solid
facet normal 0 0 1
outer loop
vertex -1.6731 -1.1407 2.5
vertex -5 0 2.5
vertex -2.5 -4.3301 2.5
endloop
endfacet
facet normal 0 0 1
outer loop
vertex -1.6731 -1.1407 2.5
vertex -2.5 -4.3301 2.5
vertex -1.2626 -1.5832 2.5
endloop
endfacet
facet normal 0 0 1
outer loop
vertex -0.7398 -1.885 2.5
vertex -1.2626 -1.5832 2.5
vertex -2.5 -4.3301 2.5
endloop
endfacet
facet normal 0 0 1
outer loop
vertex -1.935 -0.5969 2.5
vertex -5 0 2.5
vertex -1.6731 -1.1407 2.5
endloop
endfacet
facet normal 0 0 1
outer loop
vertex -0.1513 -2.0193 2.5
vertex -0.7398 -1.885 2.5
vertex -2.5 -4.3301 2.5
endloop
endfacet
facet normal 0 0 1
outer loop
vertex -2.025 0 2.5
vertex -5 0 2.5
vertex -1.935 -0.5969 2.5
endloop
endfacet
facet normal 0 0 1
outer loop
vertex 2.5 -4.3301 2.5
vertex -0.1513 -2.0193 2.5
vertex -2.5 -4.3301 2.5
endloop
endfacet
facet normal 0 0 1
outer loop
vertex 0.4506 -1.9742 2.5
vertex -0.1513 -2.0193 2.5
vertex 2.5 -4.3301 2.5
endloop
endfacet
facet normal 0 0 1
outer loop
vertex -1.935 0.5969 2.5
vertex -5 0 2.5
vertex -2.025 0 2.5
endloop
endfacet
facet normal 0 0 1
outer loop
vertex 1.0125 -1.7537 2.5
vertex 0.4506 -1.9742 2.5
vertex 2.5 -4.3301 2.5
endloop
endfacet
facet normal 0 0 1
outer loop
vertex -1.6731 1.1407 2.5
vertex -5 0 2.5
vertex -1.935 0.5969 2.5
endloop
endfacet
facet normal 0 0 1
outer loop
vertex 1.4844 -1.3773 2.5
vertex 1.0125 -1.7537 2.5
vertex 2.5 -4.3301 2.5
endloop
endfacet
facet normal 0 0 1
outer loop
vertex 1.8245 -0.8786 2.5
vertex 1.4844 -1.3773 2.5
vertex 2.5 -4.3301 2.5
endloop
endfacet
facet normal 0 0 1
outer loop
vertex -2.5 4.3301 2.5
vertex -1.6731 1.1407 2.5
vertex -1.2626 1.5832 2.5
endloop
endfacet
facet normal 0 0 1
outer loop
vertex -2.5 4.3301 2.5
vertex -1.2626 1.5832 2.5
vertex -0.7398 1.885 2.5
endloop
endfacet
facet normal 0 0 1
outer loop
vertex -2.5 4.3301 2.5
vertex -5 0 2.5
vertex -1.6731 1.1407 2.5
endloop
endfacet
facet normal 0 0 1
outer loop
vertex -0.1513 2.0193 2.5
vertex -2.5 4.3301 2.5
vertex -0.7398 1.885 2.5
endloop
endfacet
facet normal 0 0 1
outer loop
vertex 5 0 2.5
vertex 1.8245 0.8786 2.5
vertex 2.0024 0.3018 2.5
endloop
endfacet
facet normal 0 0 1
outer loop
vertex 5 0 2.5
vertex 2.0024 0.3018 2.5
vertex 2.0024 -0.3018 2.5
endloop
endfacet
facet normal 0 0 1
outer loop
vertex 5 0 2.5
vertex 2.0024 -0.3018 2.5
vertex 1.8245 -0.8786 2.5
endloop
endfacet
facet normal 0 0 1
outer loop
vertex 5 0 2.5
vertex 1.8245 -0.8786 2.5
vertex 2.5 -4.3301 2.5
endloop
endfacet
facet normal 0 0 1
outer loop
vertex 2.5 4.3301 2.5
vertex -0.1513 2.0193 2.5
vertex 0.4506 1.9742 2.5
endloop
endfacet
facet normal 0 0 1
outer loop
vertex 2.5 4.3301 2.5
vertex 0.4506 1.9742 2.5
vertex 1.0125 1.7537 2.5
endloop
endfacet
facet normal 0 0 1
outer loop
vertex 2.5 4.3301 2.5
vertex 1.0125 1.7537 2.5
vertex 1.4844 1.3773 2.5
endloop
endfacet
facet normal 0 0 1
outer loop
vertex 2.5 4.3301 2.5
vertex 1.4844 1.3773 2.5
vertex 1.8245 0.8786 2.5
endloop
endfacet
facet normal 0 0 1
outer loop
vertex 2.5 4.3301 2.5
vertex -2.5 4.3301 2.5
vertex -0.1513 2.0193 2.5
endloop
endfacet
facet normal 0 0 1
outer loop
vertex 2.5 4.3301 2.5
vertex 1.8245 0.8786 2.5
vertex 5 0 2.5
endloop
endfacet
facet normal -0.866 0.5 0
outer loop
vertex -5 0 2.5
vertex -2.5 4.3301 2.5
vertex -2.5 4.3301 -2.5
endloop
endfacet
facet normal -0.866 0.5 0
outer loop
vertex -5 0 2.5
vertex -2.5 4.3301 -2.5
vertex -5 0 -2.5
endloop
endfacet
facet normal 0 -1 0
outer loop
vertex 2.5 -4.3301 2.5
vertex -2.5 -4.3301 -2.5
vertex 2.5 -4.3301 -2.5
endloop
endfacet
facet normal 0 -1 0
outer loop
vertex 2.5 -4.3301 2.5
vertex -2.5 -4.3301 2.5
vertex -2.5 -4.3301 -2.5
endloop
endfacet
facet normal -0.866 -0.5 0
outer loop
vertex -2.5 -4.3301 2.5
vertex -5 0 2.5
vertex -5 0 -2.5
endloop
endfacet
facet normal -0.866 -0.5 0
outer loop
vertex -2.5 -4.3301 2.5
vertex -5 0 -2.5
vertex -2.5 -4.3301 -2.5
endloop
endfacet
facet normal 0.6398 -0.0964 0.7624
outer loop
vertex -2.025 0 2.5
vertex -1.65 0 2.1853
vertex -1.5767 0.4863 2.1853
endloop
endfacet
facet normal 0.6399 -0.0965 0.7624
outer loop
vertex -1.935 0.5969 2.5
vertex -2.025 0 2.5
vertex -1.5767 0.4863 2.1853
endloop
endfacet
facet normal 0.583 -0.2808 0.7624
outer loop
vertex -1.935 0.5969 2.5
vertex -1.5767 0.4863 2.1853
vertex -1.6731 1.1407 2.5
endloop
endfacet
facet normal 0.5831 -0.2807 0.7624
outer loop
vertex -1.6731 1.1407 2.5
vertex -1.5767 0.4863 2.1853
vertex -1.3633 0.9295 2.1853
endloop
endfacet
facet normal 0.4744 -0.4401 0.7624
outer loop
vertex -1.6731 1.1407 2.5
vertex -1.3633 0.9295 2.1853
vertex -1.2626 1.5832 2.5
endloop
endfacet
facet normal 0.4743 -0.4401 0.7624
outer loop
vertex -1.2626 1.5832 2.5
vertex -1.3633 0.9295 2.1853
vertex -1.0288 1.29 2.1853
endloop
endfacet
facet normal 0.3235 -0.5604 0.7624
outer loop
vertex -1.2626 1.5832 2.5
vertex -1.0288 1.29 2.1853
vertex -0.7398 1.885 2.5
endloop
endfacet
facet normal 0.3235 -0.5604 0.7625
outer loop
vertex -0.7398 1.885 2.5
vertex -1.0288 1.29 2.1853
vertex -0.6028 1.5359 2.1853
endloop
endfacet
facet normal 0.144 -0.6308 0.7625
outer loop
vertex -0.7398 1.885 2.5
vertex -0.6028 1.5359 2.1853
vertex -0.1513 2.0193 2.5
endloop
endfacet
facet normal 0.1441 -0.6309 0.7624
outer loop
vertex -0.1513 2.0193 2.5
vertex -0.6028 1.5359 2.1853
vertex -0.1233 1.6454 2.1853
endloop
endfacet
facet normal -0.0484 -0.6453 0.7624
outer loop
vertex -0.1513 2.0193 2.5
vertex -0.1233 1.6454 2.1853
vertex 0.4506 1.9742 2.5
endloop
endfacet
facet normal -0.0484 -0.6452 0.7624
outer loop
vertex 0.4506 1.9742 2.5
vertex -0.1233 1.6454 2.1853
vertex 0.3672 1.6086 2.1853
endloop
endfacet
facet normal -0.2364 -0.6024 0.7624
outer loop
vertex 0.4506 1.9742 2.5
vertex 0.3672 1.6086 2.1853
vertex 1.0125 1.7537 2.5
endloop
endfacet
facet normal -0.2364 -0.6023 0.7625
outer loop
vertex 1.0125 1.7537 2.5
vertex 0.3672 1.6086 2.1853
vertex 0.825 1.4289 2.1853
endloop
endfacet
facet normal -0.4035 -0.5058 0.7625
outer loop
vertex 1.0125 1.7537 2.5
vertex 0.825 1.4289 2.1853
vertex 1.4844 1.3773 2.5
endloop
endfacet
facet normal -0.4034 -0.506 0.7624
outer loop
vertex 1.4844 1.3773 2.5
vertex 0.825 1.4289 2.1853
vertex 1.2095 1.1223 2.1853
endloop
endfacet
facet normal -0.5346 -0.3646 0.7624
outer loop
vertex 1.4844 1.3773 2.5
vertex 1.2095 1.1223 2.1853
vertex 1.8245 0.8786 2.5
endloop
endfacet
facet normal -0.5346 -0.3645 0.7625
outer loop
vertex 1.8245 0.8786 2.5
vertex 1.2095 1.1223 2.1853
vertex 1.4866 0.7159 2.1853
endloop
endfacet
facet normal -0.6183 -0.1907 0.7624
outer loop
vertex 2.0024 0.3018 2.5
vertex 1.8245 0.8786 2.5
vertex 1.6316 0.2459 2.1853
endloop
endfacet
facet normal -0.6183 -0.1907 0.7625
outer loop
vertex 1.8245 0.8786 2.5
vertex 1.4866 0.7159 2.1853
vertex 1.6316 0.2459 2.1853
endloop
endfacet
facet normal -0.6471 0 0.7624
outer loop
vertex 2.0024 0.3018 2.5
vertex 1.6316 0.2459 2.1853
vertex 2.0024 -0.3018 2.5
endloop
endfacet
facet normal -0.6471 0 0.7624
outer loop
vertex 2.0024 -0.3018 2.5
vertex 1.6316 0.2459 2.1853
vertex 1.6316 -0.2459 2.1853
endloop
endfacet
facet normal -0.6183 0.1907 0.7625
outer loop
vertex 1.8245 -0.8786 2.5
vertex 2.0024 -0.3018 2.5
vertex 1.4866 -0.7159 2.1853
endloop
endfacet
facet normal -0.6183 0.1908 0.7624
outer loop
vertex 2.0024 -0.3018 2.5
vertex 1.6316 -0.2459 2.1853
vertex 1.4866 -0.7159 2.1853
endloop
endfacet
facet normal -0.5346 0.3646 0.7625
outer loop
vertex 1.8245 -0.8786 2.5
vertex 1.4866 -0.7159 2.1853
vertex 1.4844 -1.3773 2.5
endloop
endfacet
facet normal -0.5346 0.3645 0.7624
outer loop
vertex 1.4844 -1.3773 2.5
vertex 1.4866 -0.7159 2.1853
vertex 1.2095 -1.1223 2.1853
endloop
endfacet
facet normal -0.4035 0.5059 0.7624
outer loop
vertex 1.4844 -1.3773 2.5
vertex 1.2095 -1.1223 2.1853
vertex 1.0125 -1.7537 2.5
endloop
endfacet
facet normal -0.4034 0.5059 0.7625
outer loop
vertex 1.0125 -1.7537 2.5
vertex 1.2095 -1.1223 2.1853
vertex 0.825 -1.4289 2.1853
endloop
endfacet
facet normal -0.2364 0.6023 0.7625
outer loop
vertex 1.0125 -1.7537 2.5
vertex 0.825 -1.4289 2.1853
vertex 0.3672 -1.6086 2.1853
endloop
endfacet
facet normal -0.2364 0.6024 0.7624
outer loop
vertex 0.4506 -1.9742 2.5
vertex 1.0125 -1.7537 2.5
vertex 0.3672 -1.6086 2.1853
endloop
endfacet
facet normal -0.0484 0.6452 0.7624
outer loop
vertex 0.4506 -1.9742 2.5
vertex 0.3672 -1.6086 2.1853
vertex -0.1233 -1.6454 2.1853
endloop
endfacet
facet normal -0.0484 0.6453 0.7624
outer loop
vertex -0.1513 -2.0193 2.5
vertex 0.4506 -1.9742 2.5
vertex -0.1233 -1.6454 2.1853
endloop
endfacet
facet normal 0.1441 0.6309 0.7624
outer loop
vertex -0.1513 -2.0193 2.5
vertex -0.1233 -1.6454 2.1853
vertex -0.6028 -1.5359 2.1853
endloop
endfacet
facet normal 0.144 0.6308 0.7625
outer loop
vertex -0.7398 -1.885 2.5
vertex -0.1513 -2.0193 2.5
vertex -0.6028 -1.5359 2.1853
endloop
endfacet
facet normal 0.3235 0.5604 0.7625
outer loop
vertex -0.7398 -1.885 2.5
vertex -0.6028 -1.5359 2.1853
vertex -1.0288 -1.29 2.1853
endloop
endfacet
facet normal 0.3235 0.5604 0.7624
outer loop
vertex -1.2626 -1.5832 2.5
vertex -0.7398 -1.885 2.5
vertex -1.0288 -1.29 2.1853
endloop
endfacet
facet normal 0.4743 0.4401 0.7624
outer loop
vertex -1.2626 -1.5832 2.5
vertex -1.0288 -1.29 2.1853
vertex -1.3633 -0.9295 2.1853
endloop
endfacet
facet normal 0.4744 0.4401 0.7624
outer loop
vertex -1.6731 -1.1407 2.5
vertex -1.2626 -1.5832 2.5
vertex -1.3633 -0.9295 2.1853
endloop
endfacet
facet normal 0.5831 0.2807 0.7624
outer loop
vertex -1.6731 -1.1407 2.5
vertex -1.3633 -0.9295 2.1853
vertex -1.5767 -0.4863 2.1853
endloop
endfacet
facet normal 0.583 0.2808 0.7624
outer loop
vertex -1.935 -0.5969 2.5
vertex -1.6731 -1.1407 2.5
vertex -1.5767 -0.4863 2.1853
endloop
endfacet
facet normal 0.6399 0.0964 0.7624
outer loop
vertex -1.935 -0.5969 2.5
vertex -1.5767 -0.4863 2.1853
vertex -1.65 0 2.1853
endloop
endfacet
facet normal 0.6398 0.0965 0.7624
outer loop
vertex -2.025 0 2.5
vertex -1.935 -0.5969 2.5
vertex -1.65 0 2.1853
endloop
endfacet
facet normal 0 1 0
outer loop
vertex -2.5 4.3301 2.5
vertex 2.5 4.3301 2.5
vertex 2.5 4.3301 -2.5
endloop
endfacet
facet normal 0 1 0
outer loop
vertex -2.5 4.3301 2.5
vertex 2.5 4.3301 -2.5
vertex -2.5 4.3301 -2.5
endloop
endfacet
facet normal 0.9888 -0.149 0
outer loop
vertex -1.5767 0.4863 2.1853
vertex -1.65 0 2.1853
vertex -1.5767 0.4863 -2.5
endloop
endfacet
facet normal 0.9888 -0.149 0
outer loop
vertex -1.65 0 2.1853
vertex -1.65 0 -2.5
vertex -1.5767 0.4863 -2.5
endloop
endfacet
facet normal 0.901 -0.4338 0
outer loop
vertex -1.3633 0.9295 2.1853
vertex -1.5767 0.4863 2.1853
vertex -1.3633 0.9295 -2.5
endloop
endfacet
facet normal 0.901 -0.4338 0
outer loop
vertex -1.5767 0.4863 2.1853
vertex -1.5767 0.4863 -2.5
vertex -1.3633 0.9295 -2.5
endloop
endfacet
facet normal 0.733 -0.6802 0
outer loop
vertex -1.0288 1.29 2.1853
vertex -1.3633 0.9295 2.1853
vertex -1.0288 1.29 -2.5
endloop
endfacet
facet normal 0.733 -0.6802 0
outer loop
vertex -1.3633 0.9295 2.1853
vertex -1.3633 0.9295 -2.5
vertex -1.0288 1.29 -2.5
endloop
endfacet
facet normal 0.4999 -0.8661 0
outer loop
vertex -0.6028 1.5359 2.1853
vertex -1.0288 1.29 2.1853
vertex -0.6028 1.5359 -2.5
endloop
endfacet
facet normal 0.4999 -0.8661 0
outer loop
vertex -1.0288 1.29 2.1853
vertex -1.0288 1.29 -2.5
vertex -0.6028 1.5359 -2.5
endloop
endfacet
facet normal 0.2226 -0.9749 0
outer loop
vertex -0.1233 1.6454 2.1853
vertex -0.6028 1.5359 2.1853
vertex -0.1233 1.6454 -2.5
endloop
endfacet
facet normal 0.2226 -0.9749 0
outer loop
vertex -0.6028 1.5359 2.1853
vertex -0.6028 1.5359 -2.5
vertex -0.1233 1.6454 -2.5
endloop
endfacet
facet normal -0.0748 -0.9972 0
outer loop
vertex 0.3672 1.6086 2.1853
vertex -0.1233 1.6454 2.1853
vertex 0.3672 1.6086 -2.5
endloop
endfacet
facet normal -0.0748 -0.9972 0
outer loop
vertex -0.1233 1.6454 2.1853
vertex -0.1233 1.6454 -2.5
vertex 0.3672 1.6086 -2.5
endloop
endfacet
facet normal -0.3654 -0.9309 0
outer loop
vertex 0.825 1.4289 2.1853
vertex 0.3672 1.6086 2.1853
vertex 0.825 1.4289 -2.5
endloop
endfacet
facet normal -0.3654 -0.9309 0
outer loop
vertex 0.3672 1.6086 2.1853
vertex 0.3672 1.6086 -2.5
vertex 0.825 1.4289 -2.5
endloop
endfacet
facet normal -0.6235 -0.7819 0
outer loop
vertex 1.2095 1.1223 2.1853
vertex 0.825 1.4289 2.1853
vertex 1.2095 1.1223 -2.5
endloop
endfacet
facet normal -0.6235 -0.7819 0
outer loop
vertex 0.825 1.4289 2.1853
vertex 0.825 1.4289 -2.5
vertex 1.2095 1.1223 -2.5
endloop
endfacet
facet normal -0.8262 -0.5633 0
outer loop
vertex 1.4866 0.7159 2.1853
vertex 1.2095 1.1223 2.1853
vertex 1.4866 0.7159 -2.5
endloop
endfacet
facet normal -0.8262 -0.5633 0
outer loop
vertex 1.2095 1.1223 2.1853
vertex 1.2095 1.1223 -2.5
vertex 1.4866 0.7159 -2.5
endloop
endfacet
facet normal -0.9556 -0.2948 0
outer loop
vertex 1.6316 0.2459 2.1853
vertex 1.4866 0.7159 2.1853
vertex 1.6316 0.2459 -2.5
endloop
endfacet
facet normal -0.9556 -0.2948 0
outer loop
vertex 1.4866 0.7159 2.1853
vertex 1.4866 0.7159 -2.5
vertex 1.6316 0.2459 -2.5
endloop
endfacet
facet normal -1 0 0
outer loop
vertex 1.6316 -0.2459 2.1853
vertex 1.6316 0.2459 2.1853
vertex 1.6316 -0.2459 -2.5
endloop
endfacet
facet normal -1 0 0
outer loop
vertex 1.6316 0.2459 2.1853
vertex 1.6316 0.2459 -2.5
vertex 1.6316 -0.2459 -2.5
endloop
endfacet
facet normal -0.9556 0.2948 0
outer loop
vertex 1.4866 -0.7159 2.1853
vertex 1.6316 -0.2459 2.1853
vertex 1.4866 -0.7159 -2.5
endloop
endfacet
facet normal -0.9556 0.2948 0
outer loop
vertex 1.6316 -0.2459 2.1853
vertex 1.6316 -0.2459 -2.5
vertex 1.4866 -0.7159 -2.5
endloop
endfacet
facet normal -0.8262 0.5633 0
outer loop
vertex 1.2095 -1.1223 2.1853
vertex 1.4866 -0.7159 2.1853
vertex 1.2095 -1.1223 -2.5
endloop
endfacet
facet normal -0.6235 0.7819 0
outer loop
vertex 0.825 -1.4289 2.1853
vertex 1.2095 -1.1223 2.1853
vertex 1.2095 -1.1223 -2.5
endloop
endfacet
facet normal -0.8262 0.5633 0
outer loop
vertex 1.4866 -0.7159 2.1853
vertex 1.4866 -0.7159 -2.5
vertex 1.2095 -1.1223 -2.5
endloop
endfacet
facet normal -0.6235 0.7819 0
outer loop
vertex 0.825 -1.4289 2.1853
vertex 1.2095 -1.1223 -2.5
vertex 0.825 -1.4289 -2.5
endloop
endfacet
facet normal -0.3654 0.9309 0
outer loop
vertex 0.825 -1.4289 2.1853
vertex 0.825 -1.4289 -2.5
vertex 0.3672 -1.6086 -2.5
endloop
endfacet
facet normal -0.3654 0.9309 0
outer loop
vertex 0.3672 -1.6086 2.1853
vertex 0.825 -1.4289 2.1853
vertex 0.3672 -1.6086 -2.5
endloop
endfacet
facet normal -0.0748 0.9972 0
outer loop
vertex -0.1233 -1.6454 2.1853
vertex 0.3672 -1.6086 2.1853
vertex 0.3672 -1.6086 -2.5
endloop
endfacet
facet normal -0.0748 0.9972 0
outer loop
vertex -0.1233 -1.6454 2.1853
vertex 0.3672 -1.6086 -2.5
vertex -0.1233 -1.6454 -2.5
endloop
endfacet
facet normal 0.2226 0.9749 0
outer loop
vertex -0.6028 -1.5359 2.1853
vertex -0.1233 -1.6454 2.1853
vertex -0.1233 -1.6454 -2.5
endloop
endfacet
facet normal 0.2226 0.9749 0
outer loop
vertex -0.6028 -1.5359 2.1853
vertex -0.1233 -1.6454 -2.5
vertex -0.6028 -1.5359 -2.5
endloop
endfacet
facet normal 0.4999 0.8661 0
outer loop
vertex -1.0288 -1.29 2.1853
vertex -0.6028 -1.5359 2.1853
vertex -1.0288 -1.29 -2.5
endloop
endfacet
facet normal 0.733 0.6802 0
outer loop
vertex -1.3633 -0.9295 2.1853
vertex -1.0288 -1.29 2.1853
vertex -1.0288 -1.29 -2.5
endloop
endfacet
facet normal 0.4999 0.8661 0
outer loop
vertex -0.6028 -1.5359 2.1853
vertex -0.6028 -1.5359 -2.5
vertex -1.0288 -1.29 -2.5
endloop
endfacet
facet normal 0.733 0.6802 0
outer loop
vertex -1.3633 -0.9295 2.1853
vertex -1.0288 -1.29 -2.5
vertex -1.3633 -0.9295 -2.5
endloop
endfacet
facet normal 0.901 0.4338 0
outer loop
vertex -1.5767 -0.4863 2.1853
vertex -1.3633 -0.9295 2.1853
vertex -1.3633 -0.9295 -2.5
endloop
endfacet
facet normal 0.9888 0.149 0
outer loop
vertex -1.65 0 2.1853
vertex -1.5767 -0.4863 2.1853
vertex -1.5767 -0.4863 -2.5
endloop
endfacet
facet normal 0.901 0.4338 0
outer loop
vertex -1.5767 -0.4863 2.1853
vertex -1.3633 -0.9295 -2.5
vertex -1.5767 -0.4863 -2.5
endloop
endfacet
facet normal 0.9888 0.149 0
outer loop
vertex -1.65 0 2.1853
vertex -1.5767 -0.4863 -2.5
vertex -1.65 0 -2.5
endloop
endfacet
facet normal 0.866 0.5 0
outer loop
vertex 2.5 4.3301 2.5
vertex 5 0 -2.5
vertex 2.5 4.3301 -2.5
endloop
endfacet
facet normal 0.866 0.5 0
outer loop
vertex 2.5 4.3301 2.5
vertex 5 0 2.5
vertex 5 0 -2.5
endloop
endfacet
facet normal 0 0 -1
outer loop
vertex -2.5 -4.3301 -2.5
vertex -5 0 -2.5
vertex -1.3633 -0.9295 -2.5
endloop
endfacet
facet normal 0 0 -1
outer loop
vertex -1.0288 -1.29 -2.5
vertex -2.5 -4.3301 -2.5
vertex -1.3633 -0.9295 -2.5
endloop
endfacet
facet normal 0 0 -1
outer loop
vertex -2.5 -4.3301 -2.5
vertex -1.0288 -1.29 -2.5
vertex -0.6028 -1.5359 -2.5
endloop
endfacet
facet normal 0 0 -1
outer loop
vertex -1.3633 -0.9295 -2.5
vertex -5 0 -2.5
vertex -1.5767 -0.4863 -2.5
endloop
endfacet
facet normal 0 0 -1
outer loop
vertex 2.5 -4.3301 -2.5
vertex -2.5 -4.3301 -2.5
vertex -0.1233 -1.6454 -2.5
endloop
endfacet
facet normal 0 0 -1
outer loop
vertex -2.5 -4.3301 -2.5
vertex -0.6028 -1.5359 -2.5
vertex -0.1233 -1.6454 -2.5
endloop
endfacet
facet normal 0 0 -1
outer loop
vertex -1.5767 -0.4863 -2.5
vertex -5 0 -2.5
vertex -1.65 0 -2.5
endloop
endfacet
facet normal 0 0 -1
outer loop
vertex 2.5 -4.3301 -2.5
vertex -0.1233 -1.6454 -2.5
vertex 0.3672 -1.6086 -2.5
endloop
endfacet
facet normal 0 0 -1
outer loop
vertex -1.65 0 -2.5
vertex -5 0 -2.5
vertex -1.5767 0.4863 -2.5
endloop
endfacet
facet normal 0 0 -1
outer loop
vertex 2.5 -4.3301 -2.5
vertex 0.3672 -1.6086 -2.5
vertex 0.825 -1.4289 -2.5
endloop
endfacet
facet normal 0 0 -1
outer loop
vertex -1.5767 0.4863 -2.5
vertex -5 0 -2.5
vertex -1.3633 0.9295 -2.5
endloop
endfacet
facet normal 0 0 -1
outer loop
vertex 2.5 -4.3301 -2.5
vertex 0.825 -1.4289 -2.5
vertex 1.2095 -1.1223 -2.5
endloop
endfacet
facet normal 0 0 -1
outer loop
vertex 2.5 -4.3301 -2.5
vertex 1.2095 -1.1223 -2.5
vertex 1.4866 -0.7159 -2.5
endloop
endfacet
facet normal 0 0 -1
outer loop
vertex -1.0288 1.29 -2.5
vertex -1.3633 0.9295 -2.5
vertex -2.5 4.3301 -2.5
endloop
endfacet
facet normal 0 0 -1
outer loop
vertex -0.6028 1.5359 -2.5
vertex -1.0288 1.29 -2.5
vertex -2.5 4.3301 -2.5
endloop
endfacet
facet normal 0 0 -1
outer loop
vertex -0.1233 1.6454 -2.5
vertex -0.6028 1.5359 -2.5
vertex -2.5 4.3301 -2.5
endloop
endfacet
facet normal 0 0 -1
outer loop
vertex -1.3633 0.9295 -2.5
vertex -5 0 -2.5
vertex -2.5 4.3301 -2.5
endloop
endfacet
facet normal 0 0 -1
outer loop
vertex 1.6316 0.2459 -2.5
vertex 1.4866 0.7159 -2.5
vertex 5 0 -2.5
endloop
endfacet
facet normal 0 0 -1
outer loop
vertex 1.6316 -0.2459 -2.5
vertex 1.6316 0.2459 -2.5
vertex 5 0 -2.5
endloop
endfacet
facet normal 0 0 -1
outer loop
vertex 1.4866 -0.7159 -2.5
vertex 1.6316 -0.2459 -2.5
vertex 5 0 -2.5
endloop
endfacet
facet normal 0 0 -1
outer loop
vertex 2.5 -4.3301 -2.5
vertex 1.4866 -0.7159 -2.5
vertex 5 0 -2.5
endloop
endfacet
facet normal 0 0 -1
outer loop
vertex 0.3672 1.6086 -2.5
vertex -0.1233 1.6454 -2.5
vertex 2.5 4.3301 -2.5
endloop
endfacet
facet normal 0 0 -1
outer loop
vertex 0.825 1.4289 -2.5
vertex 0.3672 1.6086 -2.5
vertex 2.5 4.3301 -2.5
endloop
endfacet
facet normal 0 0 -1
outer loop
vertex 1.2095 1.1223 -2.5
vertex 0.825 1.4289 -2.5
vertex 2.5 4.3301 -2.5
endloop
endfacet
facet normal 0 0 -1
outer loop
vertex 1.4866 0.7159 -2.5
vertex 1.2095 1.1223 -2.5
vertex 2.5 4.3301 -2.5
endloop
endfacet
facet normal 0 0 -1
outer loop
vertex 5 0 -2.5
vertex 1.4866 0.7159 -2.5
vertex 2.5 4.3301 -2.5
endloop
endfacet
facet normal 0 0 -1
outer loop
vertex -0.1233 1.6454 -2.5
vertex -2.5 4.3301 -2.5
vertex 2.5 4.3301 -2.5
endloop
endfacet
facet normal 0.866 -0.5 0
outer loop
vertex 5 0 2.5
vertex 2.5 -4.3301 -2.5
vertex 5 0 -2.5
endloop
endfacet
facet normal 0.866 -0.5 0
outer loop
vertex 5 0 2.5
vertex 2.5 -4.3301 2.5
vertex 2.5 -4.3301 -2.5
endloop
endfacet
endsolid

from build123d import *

# Parameters (mm, degrees)
BOSS_EXTRUDE1_DEPTH             = 2.5
M4X0_7_TAPPED_HOLE1_D           = 3.3
M4X0_7_TAPPED_HOLE1_CSINK_D     = 4.05
M4X0_7_TAPPED_HOLE1_CSINK_ANGLE = 100


with BuildPart() as part:
    # Sketch1 → Boss-Extrude1 (new, symmetric)
    with BuildSketch(Plane.XY):
        Polygon((5, 0), (2.5, 4.330127019), (-2.5, 4.330127019), (-5, 0), (-2.5, -4.330127019), (2.5, -4.330127019), align=None)
    extrude(amount=BOSS_EXTRUDE1_DEPTH, both=True)

    # M4x0.7 Tapped Hole1 (through all)
    with Locations(Plane.XY.offset(2.5)):
        with Locations((0, 0)):
            CounterSinkHole(M4X0_7_TAPPED_HOLE1_D / 2, M4X0_7_TAPPED_HOLE1_CSINK_D / 2, counter_sink_angle=M4X0_7_TAPPED_HOLE1_CSINK_ANGLE)


solid = part.part
